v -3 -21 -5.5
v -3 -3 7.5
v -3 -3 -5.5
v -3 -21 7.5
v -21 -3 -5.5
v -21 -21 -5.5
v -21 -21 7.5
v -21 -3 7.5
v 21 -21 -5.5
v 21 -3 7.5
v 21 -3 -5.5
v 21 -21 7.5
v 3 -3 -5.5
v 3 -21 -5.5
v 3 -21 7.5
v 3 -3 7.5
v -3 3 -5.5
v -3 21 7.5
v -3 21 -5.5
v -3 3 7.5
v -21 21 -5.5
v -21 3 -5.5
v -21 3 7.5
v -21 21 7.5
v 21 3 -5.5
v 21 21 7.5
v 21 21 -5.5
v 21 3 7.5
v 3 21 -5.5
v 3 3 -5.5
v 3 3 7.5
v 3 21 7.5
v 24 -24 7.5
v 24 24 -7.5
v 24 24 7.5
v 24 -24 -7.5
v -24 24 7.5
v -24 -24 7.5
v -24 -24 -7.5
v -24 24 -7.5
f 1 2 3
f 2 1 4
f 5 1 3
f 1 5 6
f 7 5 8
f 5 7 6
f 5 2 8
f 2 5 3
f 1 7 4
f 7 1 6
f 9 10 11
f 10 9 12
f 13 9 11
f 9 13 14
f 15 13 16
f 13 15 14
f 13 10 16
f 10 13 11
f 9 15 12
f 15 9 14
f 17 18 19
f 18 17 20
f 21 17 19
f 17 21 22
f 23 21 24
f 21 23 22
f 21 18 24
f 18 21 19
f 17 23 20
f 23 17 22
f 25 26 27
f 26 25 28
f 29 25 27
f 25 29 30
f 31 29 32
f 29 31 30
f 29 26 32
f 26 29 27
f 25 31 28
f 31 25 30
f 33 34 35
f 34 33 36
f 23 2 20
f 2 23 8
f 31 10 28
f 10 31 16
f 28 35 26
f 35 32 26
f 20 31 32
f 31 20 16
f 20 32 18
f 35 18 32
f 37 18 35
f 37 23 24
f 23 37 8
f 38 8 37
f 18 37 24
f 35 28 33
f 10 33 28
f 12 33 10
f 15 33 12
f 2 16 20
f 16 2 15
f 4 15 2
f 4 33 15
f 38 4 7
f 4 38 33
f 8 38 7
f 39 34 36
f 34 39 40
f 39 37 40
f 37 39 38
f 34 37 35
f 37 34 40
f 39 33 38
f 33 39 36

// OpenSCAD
$fn = 32;

// ----------------------------------------------------------------------
// Pocket plate 48 x 48 x 15
// 2 x 2 pockets 18 mm square, 13 mm deep
// ----------------------------------------------------------------------

// --- parameters (mm) ---
thickness = 15;  // plate thickness
floor_t = 2;     // material left under each pocket
pocket = 18;     // pocket side length
pitch_x = 24;    // pocket pitch along X
pitch_y = 24;    // pocket pitch along Y
cols = 2;        // pockets per row
rows = 2;        // rows of pockets

// --- derived feature positions (mm) ---
depth = thickness - floor_t;        // = 13   pocket depth, down to the floor
span_x = (cols - 1) * pitch_x;      // = 24   distance between outer pockets
span_y = (rows - 1) * pitch_y;      // = 24   distance between outer pocket rows
origin_x = -span_x / 2;             // = -12   X of the first pocket
origin_y = -span_y / 2;             // = -12   Y of the first pocket
plate = [span_x + pocket + 6, span_y + pocket + 6, thickness];  // = [48, 48, 15]   overall size: pockets plus 3 mm of wall on each side
feature_centers = [
  [origin_x + 0 * pitch_x, origin_y + 0 * pitch_y],
  [origin_x + 1 * pitch_x, origin_y + 0 * pitch_y],
  [origin_x + 0 * pitch_x, origin_y + 1 * pitch_y],
  [origin_x + 1 * pitch_x, origin_y + 1 * pitch_y]
];   // pocket centres, used verbatim by the cutter loop

// plate outline, then one pocket per centre in feature_centers
difference() {
  cube(plate, center = true);
  for (centre = feature_centers)
    translate([centre[0] - pocket / 2, centre[1] - pocket / 2, plate[2] / 2 - depth])
      cube([pocket, pocket, depth + 1]);  // centred on the declared pocket centre
}
